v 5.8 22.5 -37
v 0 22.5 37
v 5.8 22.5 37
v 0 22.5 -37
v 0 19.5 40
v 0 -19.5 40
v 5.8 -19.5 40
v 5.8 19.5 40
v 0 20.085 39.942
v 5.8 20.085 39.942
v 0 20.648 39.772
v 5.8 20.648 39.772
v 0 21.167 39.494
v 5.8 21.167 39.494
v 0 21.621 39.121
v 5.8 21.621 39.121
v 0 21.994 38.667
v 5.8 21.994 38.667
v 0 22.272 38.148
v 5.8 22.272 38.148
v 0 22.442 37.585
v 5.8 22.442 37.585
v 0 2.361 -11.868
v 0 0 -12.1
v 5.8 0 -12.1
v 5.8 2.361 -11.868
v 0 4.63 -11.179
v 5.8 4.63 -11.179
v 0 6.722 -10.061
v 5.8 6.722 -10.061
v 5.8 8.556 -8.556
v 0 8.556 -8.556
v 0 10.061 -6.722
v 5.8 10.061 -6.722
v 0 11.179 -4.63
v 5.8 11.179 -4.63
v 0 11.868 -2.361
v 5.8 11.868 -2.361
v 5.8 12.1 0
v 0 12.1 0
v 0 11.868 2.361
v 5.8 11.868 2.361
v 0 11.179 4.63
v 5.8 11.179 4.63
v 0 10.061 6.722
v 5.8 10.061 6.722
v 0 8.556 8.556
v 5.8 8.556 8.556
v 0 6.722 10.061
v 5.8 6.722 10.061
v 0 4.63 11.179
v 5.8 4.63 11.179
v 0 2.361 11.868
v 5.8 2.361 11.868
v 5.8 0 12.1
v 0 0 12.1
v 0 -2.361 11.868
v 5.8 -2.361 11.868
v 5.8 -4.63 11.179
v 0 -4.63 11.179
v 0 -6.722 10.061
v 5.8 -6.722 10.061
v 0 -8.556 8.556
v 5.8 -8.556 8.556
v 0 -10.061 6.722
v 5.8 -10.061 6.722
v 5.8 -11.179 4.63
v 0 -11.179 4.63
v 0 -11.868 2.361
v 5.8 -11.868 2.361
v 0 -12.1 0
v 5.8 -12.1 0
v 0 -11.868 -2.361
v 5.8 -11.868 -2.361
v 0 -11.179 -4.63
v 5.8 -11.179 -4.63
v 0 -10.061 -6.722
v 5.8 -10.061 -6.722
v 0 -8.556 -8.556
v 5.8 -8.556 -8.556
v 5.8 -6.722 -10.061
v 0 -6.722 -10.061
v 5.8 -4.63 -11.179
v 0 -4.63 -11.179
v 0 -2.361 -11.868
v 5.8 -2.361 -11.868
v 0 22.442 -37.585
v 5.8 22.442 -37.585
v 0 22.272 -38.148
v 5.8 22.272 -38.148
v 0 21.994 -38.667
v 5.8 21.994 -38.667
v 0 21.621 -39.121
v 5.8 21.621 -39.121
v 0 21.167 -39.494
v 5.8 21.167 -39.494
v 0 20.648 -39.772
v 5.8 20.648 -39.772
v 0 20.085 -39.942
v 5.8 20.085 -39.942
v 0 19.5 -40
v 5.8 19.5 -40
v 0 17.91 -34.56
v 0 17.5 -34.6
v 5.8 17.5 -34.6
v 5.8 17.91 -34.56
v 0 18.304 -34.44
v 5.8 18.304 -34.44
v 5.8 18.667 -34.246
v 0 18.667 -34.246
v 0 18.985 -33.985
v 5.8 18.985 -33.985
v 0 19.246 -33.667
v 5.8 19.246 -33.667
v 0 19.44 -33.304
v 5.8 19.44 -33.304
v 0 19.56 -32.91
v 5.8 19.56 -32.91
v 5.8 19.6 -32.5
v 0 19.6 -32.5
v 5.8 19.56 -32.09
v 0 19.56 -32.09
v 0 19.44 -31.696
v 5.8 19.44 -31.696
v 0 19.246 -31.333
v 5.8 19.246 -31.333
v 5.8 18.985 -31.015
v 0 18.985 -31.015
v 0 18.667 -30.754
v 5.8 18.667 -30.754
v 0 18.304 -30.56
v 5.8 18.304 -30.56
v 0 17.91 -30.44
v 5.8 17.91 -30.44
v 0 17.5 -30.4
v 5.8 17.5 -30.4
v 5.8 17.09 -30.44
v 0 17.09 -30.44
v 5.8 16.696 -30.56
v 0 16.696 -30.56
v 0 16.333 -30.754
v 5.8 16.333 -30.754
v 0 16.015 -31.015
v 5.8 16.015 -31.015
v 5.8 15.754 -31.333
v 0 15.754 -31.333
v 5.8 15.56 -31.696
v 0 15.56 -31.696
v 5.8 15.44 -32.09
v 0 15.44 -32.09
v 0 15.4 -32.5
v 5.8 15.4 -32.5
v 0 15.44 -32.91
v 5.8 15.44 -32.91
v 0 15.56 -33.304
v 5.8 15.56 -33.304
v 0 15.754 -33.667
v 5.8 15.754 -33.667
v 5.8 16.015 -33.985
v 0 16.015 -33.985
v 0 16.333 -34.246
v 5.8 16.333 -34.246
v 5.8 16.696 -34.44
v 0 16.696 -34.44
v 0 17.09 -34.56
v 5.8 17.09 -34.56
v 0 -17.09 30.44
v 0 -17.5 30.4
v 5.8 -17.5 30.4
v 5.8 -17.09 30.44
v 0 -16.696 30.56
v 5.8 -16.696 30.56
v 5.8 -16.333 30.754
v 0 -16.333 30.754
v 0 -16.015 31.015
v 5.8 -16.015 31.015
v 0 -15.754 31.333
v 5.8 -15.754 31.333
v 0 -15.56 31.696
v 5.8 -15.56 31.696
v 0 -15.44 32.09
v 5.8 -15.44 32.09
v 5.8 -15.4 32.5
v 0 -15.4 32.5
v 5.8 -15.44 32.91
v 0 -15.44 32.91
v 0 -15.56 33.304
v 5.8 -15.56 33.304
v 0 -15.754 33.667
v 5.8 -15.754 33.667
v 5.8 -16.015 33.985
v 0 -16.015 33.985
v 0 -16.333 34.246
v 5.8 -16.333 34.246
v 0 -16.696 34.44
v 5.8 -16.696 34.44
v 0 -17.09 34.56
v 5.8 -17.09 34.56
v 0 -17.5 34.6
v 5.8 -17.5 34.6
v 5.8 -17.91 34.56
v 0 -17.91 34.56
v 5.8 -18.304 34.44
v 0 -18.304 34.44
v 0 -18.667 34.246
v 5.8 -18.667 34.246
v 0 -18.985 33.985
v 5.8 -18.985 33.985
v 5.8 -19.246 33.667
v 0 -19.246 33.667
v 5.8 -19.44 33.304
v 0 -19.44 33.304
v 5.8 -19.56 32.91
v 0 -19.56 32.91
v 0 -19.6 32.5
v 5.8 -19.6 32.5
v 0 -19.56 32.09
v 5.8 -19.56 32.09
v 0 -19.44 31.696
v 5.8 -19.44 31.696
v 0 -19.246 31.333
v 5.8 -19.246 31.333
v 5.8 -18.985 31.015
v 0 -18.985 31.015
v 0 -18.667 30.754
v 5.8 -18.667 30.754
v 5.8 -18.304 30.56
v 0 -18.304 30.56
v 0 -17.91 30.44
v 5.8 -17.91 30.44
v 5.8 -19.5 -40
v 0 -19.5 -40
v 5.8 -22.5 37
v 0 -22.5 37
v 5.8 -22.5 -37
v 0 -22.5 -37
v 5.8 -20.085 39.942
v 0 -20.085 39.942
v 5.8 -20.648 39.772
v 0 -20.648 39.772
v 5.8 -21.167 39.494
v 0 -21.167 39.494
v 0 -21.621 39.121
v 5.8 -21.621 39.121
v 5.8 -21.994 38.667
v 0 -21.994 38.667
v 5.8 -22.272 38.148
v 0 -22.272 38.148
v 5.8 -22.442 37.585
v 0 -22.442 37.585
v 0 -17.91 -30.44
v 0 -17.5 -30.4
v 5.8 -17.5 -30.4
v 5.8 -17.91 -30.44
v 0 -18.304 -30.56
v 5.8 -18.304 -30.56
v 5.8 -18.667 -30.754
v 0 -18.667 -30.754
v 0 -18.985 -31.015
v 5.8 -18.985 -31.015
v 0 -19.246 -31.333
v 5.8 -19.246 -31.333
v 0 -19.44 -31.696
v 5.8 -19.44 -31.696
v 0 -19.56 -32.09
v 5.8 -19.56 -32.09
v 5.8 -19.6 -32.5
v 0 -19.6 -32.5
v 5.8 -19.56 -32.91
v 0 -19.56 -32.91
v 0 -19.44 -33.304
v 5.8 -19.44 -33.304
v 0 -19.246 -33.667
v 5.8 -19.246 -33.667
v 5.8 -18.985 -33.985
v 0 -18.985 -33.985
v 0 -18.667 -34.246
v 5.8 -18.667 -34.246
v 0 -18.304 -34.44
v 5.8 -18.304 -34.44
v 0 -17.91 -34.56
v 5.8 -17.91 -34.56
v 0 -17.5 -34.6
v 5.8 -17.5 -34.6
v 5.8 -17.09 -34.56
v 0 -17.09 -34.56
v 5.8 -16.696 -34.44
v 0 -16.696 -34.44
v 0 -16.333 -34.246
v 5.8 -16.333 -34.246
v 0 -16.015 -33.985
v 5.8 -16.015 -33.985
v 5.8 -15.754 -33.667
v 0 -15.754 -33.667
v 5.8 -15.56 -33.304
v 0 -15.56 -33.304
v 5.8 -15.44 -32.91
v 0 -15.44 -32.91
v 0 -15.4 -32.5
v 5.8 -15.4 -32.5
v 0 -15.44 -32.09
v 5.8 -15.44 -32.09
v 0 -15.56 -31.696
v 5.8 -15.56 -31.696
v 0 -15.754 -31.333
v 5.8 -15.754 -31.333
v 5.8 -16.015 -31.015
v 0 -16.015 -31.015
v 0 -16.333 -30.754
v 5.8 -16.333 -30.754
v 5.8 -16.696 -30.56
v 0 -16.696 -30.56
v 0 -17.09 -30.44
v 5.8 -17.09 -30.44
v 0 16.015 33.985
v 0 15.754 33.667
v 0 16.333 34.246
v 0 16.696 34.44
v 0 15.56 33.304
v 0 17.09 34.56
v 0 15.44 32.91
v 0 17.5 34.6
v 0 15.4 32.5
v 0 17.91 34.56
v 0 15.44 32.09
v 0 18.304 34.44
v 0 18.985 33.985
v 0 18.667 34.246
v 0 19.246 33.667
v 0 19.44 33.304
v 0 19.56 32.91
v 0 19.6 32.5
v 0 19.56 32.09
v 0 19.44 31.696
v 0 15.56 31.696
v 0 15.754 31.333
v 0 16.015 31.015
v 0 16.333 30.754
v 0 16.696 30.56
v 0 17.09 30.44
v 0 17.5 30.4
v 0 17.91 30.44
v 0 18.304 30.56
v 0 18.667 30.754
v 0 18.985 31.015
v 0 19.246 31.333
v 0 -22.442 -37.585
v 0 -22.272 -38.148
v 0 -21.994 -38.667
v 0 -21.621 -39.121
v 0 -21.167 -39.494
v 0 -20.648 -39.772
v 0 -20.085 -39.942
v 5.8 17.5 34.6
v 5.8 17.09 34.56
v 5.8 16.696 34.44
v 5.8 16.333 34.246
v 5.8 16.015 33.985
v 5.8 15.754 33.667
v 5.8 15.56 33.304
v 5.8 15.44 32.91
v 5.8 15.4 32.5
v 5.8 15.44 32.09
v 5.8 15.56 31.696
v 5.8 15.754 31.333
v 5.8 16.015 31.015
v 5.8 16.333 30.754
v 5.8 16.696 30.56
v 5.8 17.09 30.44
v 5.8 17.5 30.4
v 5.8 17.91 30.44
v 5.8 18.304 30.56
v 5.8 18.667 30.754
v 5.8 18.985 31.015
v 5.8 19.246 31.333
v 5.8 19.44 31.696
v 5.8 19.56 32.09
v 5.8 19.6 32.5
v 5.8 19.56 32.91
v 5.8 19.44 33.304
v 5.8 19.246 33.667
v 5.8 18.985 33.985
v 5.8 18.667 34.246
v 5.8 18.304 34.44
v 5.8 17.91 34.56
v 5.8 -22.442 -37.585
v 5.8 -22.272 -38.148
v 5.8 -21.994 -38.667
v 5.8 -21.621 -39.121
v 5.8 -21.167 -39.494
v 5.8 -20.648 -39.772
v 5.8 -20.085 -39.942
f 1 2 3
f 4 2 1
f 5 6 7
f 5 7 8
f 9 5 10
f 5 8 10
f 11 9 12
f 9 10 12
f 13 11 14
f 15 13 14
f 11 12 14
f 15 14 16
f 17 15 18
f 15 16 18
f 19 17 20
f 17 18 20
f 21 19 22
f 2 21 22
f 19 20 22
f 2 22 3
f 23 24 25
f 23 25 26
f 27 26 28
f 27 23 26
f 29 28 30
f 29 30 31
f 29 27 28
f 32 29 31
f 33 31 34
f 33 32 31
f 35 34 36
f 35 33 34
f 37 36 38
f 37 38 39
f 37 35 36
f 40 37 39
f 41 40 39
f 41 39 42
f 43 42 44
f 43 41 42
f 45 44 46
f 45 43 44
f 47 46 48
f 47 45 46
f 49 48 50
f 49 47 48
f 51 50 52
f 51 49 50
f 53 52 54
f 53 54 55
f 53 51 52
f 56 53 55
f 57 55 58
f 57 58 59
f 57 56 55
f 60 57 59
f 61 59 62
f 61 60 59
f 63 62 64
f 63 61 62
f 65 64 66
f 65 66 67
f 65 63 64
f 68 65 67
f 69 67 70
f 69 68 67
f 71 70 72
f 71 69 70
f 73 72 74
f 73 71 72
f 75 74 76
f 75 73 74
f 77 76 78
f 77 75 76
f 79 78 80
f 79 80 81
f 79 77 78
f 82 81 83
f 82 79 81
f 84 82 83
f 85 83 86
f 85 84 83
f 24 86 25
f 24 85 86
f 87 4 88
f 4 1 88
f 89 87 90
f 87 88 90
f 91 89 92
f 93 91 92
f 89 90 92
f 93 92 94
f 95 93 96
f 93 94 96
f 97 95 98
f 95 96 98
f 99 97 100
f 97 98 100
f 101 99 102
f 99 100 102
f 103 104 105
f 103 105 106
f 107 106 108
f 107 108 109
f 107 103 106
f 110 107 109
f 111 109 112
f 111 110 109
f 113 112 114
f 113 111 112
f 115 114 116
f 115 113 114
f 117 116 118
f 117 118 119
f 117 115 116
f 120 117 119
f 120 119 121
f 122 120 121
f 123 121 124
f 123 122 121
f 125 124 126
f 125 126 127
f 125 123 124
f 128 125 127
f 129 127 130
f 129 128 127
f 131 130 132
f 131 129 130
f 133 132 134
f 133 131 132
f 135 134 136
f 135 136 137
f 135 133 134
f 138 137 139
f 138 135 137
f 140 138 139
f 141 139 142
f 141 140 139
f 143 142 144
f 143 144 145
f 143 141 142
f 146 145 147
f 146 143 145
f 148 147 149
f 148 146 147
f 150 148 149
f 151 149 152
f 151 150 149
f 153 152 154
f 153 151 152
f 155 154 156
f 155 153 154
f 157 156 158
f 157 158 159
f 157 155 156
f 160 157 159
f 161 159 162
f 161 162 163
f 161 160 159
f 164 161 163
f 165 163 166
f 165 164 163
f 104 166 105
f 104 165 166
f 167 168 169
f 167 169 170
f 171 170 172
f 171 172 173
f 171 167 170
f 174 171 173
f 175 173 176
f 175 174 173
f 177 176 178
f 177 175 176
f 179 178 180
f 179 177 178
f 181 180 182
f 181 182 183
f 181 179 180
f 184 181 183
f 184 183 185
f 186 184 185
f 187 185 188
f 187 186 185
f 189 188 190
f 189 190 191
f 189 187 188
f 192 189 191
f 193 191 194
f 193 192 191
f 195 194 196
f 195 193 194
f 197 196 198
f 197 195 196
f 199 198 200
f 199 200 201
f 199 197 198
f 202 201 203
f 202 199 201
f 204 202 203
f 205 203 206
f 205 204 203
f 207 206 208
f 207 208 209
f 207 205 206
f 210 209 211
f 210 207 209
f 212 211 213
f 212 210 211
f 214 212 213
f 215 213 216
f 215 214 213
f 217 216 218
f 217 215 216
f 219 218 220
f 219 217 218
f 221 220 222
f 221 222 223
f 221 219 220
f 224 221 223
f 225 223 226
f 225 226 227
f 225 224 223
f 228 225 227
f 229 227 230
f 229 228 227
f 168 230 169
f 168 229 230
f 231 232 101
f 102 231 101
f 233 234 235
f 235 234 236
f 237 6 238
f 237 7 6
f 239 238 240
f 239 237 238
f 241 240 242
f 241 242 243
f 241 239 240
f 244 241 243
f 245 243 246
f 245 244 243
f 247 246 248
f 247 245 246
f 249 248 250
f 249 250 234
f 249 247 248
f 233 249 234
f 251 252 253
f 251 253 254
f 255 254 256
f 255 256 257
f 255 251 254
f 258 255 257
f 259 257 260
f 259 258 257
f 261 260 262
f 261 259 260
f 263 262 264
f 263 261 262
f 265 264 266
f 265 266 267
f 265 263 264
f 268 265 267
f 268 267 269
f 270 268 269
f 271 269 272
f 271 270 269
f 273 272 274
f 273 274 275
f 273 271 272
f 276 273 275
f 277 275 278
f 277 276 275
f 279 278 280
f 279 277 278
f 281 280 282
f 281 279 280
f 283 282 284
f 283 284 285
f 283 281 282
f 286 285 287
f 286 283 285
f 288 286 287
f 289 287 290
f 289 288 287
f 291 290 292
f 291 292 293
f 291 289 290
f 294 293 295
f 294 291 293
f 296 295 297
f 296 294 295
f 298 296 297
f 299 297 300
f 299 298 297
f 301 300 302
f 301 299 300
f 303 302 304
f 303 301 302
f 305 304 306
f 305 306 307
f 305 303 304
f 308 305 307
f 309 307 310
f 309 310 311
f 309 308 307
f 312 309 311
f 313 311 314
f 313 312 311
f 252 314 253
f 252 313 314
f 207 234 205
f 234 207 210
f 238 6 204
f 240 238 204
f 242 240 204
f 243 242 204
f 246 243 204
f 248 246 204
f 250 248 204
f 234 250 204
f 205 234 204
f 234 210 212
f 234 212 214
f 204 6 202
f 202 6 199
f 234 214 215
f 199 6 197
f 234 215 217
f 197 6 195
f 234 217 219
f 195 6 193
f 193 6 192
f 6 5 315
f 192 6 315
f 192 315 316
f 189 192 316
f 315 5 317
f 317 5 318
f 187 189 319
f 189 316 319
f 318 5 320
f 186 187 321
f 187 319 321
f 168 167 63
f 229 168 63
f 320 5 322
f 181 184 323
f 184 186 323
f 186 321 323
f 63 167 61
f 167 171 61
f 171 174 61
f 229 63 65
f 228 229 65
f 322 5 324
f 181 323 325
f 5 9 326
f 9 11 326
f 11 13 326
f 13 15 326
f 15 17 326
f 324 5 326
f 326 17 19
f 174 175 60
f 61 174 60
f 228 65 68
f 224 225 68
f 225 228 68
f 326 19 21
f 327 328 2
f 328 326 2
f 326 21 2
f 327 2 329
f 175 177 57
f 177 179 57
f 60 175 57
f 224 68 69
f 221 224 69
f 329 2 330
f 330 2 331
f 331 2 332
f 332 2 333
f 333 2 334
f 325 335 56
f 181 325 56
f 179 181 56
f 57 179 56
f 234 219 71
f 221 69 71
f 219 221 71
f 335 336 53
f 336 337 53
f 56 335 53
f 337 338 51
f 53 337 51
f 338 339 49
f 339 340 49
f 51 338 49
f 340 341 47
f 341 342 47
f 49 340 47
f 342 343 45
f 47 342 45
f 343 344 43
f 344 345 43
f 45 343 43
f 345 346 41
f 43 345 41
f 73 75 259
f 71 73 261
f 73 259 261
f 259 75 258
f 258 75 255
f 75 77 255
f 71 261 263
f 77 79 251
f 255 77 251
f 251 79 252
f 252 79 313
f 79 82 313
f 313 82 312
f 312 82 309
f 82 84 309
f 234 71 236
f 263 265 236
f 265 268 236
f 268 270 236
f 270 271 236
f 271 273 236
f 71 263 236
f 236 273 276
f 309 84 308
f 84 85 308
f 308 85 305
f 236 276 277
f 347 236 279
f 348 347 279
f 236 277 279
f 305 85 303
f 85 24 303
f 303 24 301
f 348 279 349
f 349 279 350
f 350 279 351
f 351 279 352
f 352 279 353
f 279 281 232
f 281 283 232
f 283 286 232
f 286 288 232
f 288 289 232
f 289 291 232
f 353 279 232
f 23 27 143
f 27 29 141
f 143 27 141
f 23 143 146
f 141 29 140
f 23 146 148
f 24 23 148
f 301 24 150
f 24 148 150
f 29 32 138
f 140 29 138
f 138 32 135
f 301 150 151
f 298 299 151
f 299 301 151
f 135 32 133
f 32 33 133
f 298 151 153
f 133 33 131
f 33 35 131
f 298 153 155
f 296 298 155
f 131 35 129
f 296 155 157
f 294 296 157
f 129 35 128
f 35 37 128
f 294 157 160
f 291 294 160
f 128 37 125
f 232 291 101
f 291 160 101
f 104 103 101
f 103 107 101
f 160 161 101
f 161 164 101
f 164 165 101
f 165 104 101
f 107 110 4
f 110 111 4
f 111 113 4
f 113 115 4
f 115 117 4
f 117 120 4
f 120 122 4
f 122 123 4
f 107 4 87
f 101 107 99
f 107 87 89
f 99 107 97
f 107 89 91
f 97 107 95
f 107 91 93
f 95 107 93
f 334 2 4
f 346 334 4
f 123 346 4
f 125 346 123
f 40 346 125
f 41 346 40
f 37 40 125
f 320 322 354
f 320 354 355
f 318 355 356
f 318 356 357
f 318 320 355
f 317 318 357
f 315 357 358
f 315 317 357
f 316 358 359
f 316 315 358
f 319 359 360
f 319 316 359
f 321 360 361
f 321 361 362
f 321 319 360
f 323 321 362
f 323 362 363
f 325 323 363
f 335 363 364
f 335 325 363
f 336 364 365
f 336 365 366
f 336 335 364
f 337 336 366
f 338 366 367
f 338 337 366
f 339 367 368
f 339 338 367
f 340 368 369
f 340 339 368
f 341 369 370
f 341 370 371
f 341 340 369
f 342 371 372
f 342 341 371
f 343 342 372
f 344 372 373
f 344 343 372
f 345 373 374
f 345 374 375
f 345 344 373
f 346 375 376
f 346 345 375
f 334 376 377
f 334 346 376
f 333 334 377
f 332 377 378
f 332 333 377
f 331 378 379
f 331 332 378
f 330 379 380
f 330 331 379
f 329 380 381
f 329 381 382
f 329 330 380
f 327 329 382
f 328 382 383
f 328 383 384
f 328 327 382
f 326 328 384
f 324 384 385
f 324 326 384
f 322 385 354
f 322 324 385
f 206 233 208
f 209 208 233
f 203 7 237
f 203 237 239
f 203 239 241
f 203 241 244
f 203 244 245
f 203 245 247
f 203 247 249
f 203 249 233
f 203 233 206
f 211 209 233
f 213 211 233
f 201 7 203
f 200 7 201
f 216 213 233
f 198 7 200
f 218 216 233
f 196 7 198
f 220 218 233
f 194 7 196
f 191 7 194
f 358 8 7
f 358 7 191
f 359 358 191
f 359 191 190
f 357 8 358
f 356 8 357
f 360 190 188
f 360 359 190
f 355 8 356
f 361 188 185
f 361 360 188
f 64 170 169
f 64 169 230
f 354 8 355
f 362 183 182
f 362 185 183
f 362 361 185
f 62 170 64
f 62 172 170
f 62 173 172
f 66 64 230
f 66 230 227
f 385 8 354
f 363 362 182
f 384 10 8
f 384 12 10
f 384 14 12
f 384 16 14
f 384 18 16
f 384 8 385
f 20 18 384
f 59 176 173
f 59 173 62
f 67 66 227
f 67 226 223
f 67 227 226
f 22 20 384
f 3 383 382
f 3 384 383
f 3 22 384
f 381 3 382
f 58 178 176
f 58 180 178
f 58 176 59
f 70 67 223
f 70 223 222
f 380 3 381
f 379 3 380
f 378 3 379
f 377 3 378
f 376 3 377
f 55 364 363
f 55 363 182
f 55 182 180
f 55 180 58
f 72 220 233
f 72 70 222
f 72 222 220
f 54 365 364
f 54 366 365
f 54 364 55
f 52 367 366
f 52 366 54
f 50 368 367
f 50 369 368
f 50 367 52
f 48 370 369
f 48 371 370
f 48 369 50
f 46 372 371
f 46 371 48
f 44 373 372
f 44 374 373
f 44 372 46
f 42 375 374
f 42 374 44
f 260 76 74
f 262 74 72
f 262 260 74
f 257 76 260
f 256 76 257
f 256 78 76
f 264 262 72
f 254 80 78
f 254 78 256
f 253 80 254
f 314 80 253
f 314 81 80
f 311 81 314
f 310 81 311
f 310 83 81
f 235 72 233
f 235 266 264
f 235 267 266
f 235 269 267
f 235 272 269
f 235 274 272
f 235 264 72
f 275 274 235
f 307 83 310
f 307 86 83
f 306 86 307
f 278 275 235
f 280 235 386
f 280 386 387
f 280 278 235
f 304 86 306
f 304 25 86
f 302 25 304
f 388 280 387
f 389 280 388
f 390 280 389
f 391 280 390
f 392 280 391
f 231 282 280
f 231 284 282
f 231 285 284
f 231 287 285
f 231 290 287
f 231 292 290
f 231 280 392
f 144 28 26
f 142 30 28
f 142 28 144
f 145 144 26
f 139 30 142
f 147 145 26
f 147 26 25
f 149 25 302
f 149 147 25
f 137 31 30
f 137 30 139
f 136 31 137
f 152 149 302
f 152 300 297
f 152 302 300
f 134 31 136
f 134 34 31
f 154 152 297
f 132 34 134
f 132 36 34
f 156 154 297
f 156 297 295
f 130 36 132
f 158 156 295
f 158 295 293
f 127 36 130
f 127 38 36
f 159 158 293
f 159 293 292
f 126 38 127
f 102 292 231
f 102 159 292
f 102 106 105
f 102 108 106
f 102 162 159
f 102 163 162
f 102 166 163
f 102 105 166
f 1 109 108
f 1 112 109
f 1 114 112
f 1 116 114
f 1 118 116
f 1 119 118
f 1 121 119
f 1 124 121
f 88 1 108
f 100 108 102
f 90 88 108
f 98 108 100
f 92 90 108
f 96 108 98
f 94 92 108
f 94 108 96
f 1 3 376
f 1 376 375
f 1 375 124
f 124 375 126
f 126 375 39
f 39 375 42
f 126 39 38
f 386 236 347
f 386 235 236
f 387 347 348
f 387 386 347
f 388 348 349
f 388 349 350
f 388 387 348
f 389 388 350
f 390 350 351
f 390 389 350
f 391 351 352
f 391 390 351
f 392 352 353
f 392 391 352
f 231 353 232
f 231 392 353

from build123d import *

# Parameters (mm, degrees)
SKETCH_1_W      = 80
SKETCH_1_H      = 45
SKETCH_1_R      = 12.1
SKETCH_1_R_2    = 2.1
EXTRUDE_1_DEPTH = 5.8
FILLET_1_R      = 3


with BuildPart() as part:
    # ｽｹｯﾁ1 → ﾎﾞｽ - 押し出し1 (new body)
    with BuildSketch(Plane(origin=(0, 0, 0), x_dir=(0, 0, -1), z_dir=(1, 0, 0))):
        Rectangle(SKETCH_1_W, SKETCH_1_H)
        Circle(SKETCH_1_R, mode=Mode.SUBTRACT)
        with Locations((32.5, 17.5)):
            Circle(SKETCH_1_R_2, mode=Mode.SUBTRACT)
        with Locations(Location((32.5, -17.5, 0), (0, 0, 180))):
            Circle(SKETCH_1_R_2, mode=Mode.SUBTRACT)
        with Locations(Location((-32.5, 17.5, 0), (0, 0, 180))):
            Circle(SKETCH_1_R_2, mode=Mode.SUBTRACT)
        with Locations((-32.5, -17.5)):
            Circle(SKETCH_1_R_2, mode=Mode.SUBTRACT)
    extrude(amount=EXTRUDE_1_DEPTH)

    # ﾌｨﾚｯﾄ1
    fillet_1_edges = [part.edges().sort_by_distance(p)[0] for p in [
        (2.9, -22.5, -40),
        (2.9, -22.5, 40),
        (2.9, 22.5, 40),
        (2.9, 22.5, -40),
    ]]
    fillet(fillet_1_edges, radius=FILLET_1_R)


solid = part.part
